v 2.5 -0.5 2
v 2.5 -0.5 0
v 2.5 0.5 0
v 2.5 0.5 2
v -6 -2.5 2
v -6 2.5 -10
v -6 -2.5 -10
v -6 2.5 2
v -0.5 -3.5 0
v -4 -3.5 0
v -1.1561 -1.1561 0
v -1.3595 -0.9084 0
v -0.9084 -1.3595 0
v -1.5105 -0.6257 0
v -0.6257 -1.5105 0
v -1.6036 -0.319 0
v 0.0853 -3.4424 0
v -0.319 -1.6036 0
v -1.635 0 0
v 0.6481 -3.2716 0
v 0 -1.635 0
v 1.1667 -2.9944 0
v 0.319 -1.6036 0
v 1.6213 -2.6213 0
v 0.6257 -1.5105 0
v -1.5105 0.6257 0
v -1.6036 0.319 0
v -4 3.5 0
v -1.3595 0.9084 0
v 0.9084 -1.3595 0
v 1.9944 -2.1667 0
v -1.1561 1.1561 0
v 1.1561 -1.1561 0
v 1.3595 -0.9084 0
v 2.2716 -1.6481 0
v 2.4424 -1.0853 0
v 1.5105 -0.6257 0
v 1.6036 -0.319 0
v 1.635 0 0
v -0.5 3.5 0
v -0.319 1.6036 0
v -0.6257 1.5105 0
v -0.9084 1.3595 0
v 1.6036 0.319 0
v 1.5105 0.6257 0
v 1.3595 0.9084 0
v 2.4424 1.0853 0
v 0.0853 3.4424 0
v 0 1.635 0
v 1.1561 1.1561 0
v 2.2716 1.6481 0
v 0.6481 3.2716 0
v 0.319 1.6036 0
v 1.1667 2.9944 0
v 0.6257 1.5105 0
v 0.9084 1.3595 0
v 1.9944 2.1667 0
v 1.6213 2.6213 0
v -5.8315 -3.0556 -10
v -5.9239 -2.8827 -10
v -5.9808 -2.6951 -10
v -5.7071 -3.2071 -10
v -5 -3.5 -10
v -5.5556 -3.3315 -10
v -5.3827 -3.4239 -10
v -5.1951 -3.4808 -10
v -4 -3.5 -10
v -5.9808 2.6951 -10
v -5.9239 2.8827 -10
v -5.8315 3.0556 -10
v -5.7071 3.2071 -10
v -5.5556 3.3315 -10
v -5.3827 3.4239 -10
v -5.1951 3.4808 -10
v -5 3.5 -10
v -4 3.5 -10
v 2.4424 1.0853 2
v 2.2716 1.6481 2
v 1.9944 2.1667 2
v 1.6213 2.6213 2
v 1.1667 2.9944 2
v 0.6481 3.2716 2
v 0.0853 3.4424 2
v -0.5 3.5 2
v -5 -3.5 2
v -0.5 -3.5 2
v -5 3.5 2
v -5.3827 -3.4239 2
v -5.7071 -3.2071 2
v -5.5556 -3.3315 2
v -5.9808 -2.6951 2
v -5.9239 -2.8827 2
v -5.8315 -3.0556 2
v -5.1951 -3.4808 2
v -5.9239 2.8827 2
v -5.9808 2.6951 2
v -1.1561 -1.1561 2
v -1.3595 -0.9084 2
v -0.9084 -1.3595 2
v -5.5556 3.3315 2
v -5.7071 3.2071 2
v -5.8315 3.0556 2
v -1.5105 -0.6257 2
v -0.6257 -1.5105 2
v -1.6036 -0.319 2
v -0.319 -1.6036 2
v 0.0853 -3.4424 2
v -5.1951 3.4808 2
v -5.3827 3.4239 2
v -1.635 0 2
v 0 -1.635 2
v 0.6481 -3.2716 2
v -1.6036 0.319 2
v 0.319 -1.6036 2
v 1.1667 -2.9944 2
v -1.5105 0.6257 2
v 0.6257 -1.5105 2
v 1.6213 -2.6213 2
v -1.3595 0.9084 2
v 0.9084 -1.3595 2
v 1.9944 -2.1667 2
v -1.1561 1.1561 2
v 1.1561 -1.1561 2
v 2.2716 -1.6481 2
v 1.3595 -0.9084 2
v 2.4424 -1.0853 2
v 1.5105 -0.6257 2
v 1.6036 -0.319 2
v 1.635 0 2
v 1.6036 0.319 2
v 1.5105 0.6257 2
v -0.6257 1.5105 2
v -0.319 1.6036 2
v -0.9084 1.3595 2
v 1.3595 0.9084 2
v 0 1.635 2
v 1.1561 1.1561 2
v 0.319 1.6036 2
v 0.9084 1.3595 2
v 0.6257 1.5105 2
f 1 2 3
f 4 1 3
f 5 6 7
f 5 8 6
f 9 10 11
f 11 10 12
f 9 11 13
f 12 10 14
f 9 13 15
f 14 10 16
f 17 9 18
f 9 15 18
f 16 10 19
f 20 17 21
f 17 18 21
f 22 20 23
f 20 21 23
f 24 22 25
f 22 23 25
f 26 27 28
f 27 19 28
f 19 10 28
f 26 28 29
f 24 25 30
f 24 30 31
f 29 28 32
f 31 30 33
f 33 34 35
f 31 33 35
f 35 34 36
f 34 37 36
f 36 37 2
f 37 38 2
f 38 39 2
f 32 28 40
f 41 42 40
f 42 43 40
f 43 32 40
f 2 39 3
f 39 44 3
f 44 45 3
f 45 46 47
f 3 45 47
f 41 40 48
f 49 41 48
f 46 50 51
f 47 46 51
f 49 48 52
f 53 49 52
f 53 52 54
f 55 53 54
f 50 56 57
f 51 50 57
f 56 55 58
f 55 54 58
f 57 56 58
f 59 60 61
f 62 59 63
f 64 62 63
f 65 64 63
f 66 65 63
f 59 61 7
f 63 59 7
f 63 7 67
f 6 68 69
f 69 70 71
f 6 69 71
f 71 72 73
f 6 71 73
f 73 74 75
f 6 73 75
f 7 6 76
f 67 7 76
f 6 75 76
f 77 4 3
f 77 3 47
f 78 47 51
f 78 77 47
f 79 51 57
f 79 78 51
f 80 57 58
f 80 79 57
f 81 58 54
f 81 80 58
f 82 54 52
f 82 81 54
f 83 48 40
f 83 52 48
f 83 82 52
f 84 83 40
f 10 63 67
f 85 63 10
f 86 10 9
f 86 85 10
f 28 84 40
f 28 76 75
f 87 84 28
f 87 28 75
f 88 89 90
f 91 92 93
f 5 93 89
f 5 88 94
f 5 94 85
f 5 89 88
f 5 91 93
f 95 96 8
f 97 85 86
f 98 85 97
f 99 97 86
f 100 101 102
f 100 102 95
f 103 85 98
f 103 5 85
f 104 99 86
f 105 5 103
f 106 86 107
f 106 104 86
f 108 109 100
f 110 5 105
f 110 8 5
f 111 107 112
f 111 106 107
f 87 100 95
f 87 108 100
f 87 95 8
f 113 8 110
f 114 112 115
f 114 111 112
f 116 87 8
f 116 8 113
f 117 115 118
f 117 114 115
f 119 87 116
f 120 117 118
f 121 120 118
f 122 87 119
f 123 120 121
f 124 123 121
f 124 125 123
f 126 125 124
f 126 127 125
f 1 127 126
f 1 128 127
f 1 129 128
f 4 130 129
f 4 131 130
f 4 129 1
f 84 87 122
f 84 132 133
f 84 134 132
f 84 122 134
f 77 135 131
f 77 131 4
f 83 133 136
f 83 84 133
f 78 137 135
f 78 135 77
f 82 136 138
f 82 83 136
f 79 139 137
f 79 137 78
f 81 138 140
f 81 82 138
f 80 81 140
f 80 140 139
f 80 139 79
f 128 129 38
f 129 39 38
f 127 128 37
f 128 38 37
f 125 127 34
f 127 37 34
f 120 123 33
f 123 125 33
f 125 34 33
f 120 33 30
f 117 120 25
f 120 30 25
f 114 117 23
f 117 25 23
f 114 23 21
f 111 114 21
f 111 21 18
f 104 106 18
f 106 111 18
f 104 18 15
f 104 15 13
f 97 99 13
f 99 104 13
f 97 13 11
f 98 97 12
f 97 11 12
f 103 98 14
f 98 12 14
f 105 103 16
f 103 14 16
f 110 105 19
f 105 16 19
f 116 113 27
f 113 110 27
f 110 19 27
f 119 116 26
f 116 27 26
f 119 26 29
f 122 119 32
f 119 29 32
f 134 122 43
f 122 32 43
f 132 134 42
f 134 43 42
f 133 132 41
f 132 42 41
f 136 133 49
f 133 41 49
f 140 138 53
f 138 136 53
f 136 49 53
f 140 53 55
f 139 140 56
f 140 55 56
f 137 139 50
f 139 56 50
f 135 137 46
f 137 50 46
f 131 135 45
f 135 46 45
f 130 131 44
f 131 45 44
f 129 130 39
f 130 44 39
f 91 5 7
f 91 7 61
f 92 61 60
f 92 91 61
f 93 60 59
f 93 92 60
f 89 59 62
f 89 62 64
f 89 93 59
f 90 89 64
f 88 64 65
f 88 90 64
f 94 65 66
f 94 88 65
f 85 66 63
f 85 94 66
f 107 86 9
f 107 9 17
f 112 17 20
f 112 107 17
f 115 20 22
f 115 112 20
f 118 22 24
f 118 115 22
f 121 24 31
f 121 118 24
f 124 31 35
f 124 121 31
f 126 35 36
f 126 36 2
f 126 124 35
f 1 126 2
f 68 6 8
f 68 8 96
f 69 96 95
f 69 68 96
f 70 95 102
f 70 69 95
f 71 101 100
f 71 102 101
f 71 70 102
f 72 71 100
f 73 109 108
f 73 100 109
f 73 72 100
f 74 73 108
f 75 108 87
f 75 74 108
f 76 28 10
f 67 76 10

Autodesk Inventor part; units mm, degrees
ref_plane "YZ Plane" through (0, 0, 0) normal (1, 0, 0) x (0, 1, 0)
ref_plane "XZ Plane" through (0, 0, 0) normal (0, 1, 0) x (-1, 0, 0)
ref_plane "XY Plane" through (0, 0, 0) normal (0, 0, 1) x (1, 0, 0)
sketch "スケッチ1" plane through (0, 0, 0) normal (0, 0, 1) x (1, 0, 0)
  circle A0 centre (0, 0) radius 1.635
  line L0 (-6, -3.5) -> (2.5, -3.5)
  line L1 (2.5, -3.5) -> (2.5, 3.5)
  line L2 (2.5, 3.5) -> (-6, 3.5)
  line L3 (-6, 3.5) -> (-6, -3.5)
  line L4 (-6, -3.5) -> (2.5, 3.5) construction
  line L5 (2.5, -3.5) -> (-6, 3.5) construction
  line L6 (-6, 0) -> (2.5, 0) construction
  line L7 (-4, 3.5) -> (-4, -3.5)
  point P0 (-1.75, 0)
  dimension "d0" = 3.27
  dimension "d1" = 7
  dimension "d2" = 2.5
  dimension "d3" = 6
  dimension "d6" = 2
extrude "押し出し1" add sketch "スケッチ1" along normal blind 2
extrude "押し出し2" add sketch "スケッチ1" against normal blind 10 contours L3 L2 L7 L0
fillet "フィレット1" radius 3 2 edges at (2.5, 3.5, 1) (2.5, -3.5, 1)
fillet "フィレット2" radius 1 2 edges at (-6, -3.5, -4) (-6, 3.5, -4)
properties part number "guide_link"
